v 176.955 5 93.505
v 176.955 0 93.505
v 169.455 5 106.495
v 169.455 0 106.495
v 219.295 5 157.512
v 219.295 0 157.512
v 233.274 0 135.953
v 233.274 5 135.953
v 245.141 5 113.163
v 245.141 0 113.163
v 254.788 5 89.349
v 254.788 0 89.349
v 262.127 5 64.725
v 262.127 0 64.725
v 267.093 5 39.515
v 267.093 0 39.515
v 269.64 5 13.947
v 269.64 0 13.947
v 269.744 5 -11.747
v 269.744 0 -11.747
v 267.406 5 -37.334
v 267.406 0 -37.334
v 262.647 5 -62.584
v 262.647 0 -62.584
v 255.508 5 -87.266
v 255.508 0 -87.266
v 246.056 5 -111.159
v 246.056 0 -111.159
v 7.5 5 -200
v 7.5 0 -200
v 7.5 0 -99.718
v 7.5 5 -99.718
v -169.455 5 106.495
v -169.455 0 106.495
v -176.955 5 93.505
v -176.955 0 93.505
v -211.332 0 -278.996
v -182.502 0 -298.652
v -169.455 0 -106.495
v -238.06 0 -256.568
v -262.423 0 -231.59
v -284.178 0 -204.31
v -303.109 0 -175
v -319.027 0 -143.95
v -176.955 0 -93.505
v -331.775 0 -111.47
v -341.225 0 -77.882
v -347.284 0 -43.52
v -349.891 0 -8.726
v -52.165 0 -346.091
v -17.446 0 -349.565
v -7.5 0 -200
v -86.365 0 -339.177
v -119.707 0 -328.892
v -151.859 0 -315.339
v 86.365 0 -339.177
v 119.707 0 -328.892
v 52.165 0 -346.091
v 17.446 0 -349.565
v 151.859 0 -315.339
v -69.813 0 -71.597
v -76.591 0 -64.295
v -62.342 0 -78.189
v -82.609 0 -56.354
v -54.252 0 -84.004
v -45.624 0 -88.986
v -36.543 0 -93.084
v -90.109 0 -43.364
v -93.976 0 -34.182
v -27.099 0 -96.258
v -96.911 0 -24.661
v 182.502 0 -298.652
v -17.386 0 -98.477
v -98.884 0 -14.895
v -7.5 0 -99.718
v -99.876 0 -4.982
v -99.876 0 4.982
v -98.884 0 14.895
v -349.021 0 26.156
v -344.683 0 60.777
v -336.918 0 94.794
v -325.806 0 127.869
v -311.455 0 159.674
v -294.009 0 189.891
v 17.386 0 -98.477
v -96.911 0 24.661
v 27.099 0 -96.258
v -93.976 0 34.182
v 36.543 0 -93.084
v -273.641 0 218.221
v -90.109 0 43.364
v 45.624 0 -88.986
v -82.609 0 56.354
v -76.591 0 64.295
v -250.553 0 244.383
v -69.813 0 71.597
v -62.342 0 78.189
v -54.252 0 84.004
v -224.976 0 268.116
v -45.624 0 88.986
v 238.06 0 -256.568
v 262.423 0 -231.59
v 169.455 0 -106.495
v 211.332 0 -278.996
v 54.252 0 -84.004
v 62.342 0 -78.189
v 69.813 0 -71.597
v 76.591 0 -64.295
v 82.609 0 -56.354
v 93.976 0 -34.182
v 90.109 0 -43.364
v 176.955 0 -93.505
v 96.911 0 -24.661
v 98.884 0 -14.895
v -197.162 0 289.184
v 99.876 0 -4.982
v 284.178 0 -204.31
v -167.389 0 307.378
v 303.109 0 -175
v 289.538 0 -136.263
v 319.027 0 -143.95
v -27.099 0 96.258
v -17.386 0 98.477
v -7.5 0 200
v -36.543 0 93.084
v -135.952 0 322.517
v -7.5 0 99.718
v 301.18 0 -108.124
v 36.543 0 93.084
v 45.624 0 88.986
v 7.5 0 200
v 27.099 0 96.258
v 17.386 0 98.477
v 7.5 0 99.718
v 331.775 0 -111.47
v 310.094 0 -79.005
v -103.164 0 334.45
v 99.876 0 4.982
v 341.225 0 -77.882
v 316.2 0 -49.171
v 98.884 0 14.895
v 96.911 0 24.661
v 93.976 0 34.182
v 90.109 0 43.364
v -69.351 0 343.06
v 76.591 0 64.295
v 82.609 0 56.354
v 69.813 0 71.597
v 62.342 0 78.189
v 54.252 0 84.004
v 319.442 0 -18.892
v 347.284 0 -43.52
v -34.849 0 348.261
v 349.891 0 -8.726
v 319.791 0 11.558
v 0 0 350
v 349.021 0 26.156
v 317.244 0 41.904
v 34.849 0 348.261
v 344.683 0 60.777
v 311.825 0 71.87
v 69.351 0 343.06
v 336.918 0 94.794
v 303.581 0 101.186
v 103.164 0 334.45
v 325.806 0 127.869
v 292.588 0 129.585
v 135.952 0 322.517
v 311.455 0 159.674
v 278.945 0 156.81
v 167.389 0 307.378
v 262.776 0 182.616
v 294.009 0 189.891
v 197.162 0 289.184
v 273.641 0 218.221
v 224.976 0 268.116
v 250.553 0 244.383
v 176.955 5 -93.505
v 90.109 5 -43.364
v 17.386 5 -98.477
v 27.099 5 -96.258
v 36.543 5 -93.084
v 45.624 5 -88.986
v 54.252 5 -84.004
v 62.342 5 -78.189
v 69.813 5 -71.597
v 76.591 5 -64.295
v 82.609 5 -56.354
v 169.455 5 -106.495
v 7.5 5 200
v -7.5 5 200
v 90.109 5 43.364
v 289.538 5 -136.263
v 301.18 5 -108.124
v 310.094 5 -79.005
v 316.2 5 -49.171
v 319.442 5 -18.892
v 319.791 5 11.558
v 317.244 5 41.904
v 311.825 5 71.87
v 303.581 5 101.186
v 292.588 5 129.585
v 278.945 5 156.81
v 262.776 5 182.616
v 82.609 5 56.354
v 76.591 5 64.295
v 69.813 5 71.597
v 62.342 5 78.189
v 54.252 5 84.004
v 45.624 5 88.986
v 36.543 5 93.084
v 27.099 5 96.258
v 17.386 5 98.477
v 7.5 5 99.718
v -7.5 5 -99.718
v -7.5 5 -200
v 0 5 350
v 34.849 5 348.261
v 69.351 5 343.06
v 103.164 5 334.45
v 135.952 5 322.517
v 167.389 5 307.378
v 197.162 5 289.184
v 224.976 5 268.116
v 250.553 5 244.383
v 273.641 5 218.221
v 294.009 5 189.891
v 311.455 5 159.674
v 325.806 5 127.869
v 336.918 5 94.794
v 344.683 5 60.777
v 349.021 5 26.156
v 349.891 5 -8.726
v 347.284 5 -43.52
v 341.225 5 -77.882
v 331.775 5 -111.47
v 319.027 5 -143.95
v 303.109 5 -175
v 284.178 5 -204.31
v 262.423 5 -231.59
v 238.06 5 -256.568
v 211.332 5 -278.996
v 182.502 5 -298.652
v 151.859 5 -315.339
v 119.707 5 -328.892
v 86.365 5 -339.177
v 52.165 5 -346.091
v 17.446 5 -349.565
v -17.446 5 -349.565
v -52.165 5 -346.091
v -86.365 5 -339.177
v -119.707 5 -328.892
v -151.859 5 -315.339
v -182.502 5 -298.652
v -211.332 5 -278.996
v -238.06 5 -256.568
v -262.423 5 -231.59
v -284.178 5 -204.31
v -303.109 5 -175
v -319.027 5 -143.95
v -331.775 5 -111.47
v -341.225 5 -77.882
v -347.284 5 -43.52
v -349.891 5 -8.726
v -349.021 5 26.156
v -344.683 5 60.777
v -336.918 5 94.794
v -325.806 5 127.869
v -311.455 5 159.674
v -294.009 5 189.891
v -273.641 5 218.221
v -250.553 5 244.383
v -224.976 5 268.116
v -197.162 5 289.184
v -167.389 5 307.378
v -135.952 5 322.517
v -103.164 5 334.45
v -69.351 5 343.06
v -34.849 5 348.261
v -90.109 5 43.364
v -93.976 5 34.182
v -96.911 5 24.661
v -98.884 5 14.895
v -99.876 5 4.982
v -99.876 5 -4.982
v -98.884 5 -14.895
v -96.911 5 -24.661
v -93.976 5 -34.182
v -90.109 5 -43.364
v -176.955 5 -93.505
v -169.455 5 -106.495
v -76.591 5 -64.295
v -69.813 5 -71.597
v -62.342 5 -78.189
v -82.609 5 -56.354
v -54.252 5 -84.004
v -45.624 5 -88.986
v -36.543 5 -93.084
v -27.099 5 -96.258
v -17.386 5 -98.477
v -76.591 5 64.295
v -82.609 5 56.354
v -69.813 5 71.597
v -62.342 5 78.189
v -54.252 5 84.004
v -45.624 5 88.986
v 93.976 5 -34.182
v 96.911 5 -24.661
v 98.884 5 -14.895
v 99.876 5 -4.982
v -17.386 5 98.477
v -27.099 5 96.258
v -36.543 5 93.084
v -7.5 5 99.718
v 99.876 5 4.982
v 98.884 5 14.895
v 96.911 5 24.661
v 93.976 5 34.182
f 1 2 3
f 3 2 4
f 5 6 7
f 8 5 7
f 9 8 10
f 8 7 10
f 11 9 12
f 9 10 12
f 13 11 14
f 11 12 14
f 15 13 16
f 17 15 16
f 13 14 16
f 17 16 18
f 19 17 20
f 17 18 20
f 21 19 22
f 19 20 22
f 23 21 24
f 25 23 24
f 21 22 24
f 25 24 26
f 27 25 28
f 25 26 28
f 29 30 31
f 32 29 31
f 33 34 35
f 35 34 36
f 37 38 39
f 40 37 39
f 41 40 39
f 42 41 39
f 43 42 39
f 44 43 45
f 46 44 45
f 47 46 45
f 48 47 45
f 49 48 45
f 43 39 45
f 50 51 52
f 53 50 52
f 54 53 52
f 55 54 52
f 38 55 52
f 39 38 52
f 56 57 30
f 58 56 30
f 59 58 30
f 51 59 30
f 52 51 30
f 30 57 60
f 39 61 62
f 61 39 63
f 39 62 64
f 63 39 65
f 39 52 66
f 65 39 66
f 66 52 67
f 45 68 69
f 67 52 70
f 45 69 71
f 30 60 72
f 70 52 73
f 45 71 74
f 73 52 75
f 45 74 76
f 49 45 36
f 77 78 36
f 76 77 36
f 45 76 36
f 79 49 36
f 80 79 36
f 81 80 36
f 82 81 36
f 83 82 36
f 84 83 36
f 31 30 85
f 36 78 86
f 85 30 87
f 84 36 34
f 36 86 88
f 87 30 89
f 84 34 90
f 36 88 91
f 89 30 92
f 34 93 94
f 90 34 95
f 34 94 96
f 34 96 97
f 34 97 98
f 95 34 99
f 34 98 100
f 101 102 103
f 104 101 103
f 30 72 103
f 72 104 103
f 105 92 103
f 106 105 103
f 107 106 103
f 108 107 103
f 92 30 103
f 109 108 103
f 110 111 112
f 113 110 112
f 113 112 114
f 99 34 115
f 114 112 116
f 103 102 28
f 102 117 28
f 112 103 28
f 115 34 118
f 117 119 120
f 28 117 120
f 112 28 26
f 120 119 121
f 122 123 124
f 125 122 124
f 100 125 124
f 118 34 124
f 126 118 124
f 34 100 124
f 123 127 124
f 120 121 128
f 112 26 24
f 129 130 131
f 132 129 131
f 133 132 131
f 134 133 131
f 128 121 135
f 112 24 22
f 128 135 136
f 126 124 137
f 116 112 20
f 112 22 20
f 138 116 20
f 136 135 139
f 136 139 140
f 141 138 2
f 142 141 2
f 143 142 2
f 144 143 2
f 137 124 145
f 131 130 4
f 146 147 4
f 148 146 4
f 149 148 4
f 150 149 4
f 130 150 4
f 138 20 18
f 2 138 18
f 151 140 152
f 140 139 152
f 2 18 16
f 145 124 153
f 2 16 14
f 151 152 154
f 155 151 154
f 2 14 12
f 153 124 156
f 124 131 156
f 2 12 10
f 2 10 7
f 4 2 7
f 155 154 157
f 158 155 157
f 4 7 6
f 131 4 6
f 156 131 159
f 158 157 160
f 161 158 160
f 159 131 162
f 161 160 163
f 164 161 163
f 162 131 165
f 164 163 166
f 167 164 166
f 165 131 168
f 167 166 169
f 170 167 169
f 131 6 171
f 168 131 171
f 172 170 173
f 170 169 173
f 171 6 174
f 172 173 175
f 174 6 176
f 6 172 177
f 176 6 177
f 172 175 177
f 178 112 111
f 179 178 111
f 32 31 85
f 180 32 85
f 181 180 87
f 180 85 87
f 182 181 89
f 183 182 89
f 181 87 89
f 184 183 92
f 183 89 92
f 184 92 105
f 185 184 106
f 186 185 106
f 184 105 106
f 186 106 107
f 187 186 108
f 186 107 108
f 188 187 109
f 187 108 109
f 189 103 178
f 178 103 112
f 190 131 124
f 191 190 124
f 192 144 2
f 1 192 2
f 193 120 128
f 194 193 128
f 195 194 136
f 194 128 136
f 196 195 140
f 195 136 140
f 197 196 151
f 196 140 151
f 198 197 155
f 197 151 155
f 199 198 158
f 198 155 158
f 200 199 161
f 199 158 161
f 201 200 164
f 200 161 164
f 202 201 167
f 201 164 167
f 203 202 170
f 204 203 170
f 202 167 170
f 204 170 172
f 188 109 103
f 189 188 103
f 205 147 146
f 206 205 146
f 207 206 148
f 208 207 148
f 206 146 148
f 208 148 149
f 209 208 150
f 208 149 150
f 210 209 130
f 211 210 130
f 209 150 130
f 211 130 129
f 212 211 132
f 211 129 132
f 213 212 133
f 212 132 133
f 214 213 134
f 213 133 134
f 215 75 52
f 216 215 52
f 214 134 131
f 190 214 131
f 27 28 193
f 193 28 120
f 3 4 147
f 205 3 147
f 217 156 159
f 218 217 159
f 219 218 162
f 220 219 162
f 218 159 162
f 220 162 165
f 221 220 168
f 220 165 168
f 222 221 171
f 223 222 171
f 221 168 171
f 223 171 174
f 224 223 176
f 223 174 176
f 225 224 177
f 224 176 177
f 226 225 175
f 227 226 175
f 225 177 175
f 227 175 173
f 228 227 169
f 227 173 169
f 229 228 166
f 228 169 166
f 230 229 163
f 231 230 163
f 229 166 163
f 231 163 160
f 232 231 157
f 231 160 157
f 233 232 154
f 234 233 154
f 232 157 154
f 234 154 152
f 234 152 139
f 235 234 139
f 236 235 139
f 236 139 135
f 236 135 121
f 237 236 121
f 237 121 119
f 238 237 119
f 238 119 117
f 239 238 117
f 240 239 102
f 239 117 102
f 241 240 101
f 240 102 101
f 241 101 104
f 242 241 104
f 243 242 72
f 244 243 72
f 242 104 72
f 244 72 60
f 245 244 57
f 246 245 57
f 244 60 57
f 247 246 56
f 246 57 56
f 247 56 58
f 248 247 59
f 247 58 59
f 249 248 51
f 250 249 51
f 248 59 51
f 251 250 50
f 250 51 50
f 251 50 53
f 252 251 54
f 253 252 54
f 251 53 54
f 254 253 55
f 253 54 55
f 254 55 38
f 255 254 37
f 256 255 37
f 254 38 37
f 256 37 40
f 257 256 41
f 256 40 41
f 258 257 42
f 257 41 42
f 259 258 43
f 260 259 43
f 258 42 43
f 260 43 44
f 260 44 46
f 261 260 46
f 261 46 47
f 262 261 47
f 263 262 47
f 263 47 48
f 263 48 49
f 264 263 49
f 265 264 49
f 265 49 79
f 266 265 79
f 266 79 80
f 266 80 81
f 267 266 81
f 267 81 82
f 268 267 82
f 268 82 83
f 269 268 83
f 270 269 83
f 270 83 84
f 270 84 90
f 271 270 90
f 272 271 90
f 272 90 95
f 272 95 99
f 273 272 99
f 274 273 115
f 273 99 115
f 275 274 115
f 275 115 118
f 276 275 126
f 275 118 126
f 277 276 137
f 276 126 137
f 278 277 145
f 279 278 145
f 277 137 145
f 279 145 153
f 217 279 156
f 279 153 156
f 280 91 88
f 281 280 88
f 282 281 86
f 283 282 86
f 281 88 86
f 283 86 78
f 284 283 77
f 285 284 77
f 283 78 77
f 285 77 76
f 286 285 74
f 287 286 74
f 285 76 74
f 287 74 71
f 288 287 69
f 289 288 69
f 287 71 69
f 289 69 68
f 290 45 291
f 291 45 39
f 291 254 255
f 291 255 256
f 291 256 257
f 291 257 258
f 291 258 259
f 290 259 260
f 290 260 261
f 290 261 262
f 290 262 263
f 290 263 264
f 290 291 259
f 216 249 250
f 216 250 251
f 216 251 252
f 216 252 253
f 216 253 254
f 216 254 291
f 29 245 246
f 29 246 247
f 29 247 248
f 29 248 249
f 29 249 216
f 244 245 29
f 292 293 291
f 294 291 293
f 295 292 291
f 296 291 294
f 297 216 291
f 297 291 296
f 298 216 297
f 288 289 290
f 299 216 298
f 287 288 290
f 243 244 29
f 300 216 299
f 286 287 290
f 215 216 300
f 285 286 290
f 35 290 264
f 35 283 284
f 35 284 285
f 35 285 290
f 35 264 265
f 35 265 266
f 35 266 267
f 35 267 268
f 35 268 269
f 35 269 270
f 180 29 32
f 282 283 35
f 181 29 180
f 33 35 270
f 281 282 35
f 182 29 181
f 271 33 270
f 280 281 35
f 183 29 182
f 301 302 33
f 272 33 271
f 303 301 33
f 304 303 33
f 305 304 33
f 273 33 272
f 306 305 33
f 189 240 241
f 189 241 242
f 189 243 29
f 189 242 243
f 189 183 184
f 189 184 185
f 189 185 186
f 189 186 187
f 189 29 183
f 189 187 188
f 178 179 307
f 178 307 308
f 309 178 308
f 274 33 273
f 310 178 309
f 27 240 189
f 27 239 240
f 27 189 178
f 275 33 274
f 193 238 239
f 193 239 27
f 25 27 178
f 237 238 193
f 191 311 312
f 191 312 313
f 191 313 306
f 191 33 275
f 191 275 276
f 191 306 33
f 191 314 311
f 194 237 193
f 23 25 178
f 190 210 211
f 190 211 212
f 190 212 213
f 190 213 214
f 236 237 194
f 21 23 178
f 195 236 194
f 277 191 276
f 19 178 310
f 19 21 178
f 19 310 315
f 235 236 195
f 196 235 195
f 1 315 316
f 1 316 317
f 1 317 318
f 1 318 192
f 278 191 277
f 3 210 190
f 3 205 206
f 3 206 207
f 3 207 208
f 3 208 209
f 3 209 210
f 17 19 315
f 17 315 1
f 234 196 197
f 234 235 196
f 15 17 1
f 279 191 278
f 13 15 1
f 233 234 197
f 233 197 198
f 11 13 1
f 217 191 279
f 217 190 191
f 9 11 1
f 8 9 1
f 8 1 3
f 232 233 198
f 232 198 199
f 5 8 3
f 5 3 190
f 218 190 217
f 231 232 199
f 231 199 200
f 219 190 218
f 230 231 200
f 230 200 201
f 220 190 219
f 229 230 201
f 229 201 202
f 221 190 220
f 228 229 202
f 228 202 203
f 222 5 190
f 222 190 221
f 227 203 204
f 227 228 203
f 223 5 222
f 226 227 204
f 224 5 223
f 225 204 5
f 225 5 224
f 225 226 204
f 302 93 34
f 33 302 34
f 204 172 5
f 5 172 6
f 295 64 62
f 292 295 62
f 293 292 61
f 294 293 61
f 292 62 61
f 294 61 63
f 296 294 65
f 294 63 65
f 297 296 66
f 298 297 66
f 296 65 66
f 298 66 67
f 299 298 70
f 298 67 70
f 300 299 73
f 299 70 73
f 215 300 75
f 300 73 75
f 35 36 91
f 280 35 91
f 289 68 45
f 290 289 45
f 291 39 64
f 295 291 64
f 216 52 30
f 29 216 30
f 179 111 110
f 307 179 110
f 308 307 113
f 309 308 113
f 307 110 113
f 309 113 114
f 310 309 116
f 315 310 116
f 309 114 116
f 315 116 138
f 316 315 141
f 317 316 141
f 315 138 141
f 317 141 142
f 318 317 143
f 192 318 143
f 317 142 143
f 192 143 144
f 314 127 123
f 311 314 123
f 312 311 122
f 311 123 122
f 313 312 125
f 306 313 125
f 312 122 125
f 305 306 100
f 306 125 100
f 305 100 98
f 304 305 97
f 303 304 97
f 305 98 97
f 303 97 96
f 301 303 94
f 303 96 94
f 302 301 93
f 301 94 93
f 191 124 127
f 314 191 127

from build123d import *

# Parameters (mm, degrees)
IZIM1_R                     = 350
Y_KSEKLIK_EKSTR_ZYON1_DEPTH = 5


with BuildPart() as part:
    # Çizim1 → Yükseklik-Ekstrüzyon1 (new body)
    with BuildSketch(Plane(origin=(0, 0, 0), x_dir=(1, 0, 0), z_dir=(0, 1, 0))):
        with Locations(Location((0, 0, 0), (0, 0, 270))):
            Circle(IZIM1_R)
        with BuildLine():
            Line((82.608627247, 56.354367216), (169.455080757, 106.495190528))
            Line((169.455080757, 106.495190528), (176.955080757, 93.504809472))
            Line((176.955080757, 93.504809472), (90.108627247, 43.36398616))
            ThreePointArc((90.108627247, 43.36398616), (100, 0), (90.108627247, -43.36398616))
            Line((90.108627247, -43.36398616), (176.955080757, -93.504809472))
            Line((176.955080757, -93.504809472), (169.455080757, -106.495190528))
            Line((169.455080757, -106.495190528), (82.608627247, -56.354367216))
            ThreePointArc((82.608627247, -56.354367216), (50, -86.602540378), (7.5, -99.718353376))
            Line((7.5, -99.718353376), (7.5, -200))
            Line((7.5, -200), (-7.5, -200))
            Line((-7.5, -200), (-7.5, -99.718353376))
            ThreePointArc((-7.5, -99.718353376), (-50, -86.602540378), (-82.608627247, -56.354367216))
            Line((-82.608627247, -56.354367216), (-169.455080757, -106.495190528))
            Line((-169.455080757, -106.495190528), (-176.955080757, -93.504809472))
            Line((-176.955080757, -93.504809472), (-90.108627247, -43.36398616))
            ThreePointArc((-90.108627247, -43.36398616), (-100, 0), (-90.108627247, 43.36398616))
            Line((-90.108627247, 43.36398616), (-176.955080757, 93.504809472))
            Line((-176.955080757, 93.504809472), (-169.455080757, 106.495190528))
            Line((-169.455080757, 106.495190528), (-82.608627247, 56.354367216))
            ThreePointArc((-82.608627247, 56.354367216), (-50, 86.602540378), (-7.5, 99.718353376))
            Line((-7.5, 99.718353376), (-7.5, 200))
            Line((-7.5, 200), (7.5, 200))
            Line((7.5, 200), (7.5, 99.718353376))
            ThreePointArc((7.5, 99.718353376), (50, 86.602540378), (82.608627247, 56.354367216))
        make_face(mode=Mode.SUBTRACT)
        with BuildLine():
            Line((246.056268189, 111.158953237), (289.538139145, 136.263223139))
            ThreePointArc((289.538139145, 136.263223139), (318.878995434, -26.761656733), (262.776482412, -182.615772295))
            Line((262.776482412, -182.615772295), (219.294611456, -157.511502394))
            ThreePointArc((219.294611456, -157.511502394), (268.670455631, -26.761656733), (246.056268189, 111.158953237))
        make_face(mode=Mode.SUBTRACT)
    extrude(amount=Y_KSEKLIK_EKSTR_ZYON1_DEPTH)


solid = part.part
